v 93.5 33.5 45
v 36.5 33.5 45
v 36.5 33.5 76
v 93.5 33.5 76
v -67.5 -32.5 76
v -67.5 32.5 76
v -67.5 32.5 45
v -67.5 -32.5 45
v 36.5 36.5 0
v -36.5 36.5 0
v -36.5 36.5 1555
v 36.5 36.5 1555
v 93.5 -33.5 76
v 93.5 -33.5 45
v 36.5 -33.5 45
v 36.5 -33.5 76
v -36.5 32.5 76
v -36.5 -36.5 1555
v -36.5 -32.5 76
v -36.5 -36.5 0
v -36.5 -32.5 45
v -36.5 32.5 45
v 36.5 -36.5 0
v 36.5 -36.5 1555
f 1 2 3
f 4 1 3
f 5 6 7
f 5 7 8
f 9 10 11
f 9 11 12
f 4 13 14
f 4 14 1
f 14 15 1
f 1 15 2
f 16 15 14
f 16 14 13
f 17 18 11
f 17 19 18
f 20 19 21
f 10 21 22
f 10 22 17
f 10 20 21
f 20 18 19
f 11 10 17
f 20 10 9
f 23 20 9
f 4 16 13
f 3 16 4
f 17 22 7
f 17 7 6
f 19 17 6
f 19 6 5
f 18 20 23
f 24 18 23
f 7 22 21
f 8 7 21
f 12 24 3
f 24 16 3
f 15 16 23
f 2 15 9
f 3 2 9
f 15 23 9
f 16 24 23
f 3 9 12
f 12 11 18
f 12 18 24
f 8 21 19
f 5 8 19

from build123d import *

# Parameters (mm, degrees)
F0_W     = 73
F0_H     = 73
F1_DEPTH = 1555
F2_W     = 65
F2_H     = 31
F3_DEPTH = 31
F4_W     = 67
F4_H     = 31
F5_DEPTH = 57


with BuildPart() as f1:
    # F0 (on Top) → F1 (new body)
    with BuildSketch(Plane.XY):
        Rectangle(F0_W, F0_H)
    extrude(amount=F1_DEPTH)

    # F2 (on face) → F3 (join)
    with BuildSketch(Plane(origin=(-36.5, 0, 0), x_dir=(0, -1, 0), z_dir=(-1, 0, 0))):
        with Locations((0, 60.5)):
            Rectangle(F2_W, F2_H)
    extrude(amount=F3_DEPTH)

    # F4 (on face) → F5 (join)
    with BuildSketch(Plane.YZ.offset(36.5)):
        with Locations((0, 60.5)):
            Rectangle(F4_W, F4_H)
    extrude(amount=F5_DEPTH)


solid = f1.part
